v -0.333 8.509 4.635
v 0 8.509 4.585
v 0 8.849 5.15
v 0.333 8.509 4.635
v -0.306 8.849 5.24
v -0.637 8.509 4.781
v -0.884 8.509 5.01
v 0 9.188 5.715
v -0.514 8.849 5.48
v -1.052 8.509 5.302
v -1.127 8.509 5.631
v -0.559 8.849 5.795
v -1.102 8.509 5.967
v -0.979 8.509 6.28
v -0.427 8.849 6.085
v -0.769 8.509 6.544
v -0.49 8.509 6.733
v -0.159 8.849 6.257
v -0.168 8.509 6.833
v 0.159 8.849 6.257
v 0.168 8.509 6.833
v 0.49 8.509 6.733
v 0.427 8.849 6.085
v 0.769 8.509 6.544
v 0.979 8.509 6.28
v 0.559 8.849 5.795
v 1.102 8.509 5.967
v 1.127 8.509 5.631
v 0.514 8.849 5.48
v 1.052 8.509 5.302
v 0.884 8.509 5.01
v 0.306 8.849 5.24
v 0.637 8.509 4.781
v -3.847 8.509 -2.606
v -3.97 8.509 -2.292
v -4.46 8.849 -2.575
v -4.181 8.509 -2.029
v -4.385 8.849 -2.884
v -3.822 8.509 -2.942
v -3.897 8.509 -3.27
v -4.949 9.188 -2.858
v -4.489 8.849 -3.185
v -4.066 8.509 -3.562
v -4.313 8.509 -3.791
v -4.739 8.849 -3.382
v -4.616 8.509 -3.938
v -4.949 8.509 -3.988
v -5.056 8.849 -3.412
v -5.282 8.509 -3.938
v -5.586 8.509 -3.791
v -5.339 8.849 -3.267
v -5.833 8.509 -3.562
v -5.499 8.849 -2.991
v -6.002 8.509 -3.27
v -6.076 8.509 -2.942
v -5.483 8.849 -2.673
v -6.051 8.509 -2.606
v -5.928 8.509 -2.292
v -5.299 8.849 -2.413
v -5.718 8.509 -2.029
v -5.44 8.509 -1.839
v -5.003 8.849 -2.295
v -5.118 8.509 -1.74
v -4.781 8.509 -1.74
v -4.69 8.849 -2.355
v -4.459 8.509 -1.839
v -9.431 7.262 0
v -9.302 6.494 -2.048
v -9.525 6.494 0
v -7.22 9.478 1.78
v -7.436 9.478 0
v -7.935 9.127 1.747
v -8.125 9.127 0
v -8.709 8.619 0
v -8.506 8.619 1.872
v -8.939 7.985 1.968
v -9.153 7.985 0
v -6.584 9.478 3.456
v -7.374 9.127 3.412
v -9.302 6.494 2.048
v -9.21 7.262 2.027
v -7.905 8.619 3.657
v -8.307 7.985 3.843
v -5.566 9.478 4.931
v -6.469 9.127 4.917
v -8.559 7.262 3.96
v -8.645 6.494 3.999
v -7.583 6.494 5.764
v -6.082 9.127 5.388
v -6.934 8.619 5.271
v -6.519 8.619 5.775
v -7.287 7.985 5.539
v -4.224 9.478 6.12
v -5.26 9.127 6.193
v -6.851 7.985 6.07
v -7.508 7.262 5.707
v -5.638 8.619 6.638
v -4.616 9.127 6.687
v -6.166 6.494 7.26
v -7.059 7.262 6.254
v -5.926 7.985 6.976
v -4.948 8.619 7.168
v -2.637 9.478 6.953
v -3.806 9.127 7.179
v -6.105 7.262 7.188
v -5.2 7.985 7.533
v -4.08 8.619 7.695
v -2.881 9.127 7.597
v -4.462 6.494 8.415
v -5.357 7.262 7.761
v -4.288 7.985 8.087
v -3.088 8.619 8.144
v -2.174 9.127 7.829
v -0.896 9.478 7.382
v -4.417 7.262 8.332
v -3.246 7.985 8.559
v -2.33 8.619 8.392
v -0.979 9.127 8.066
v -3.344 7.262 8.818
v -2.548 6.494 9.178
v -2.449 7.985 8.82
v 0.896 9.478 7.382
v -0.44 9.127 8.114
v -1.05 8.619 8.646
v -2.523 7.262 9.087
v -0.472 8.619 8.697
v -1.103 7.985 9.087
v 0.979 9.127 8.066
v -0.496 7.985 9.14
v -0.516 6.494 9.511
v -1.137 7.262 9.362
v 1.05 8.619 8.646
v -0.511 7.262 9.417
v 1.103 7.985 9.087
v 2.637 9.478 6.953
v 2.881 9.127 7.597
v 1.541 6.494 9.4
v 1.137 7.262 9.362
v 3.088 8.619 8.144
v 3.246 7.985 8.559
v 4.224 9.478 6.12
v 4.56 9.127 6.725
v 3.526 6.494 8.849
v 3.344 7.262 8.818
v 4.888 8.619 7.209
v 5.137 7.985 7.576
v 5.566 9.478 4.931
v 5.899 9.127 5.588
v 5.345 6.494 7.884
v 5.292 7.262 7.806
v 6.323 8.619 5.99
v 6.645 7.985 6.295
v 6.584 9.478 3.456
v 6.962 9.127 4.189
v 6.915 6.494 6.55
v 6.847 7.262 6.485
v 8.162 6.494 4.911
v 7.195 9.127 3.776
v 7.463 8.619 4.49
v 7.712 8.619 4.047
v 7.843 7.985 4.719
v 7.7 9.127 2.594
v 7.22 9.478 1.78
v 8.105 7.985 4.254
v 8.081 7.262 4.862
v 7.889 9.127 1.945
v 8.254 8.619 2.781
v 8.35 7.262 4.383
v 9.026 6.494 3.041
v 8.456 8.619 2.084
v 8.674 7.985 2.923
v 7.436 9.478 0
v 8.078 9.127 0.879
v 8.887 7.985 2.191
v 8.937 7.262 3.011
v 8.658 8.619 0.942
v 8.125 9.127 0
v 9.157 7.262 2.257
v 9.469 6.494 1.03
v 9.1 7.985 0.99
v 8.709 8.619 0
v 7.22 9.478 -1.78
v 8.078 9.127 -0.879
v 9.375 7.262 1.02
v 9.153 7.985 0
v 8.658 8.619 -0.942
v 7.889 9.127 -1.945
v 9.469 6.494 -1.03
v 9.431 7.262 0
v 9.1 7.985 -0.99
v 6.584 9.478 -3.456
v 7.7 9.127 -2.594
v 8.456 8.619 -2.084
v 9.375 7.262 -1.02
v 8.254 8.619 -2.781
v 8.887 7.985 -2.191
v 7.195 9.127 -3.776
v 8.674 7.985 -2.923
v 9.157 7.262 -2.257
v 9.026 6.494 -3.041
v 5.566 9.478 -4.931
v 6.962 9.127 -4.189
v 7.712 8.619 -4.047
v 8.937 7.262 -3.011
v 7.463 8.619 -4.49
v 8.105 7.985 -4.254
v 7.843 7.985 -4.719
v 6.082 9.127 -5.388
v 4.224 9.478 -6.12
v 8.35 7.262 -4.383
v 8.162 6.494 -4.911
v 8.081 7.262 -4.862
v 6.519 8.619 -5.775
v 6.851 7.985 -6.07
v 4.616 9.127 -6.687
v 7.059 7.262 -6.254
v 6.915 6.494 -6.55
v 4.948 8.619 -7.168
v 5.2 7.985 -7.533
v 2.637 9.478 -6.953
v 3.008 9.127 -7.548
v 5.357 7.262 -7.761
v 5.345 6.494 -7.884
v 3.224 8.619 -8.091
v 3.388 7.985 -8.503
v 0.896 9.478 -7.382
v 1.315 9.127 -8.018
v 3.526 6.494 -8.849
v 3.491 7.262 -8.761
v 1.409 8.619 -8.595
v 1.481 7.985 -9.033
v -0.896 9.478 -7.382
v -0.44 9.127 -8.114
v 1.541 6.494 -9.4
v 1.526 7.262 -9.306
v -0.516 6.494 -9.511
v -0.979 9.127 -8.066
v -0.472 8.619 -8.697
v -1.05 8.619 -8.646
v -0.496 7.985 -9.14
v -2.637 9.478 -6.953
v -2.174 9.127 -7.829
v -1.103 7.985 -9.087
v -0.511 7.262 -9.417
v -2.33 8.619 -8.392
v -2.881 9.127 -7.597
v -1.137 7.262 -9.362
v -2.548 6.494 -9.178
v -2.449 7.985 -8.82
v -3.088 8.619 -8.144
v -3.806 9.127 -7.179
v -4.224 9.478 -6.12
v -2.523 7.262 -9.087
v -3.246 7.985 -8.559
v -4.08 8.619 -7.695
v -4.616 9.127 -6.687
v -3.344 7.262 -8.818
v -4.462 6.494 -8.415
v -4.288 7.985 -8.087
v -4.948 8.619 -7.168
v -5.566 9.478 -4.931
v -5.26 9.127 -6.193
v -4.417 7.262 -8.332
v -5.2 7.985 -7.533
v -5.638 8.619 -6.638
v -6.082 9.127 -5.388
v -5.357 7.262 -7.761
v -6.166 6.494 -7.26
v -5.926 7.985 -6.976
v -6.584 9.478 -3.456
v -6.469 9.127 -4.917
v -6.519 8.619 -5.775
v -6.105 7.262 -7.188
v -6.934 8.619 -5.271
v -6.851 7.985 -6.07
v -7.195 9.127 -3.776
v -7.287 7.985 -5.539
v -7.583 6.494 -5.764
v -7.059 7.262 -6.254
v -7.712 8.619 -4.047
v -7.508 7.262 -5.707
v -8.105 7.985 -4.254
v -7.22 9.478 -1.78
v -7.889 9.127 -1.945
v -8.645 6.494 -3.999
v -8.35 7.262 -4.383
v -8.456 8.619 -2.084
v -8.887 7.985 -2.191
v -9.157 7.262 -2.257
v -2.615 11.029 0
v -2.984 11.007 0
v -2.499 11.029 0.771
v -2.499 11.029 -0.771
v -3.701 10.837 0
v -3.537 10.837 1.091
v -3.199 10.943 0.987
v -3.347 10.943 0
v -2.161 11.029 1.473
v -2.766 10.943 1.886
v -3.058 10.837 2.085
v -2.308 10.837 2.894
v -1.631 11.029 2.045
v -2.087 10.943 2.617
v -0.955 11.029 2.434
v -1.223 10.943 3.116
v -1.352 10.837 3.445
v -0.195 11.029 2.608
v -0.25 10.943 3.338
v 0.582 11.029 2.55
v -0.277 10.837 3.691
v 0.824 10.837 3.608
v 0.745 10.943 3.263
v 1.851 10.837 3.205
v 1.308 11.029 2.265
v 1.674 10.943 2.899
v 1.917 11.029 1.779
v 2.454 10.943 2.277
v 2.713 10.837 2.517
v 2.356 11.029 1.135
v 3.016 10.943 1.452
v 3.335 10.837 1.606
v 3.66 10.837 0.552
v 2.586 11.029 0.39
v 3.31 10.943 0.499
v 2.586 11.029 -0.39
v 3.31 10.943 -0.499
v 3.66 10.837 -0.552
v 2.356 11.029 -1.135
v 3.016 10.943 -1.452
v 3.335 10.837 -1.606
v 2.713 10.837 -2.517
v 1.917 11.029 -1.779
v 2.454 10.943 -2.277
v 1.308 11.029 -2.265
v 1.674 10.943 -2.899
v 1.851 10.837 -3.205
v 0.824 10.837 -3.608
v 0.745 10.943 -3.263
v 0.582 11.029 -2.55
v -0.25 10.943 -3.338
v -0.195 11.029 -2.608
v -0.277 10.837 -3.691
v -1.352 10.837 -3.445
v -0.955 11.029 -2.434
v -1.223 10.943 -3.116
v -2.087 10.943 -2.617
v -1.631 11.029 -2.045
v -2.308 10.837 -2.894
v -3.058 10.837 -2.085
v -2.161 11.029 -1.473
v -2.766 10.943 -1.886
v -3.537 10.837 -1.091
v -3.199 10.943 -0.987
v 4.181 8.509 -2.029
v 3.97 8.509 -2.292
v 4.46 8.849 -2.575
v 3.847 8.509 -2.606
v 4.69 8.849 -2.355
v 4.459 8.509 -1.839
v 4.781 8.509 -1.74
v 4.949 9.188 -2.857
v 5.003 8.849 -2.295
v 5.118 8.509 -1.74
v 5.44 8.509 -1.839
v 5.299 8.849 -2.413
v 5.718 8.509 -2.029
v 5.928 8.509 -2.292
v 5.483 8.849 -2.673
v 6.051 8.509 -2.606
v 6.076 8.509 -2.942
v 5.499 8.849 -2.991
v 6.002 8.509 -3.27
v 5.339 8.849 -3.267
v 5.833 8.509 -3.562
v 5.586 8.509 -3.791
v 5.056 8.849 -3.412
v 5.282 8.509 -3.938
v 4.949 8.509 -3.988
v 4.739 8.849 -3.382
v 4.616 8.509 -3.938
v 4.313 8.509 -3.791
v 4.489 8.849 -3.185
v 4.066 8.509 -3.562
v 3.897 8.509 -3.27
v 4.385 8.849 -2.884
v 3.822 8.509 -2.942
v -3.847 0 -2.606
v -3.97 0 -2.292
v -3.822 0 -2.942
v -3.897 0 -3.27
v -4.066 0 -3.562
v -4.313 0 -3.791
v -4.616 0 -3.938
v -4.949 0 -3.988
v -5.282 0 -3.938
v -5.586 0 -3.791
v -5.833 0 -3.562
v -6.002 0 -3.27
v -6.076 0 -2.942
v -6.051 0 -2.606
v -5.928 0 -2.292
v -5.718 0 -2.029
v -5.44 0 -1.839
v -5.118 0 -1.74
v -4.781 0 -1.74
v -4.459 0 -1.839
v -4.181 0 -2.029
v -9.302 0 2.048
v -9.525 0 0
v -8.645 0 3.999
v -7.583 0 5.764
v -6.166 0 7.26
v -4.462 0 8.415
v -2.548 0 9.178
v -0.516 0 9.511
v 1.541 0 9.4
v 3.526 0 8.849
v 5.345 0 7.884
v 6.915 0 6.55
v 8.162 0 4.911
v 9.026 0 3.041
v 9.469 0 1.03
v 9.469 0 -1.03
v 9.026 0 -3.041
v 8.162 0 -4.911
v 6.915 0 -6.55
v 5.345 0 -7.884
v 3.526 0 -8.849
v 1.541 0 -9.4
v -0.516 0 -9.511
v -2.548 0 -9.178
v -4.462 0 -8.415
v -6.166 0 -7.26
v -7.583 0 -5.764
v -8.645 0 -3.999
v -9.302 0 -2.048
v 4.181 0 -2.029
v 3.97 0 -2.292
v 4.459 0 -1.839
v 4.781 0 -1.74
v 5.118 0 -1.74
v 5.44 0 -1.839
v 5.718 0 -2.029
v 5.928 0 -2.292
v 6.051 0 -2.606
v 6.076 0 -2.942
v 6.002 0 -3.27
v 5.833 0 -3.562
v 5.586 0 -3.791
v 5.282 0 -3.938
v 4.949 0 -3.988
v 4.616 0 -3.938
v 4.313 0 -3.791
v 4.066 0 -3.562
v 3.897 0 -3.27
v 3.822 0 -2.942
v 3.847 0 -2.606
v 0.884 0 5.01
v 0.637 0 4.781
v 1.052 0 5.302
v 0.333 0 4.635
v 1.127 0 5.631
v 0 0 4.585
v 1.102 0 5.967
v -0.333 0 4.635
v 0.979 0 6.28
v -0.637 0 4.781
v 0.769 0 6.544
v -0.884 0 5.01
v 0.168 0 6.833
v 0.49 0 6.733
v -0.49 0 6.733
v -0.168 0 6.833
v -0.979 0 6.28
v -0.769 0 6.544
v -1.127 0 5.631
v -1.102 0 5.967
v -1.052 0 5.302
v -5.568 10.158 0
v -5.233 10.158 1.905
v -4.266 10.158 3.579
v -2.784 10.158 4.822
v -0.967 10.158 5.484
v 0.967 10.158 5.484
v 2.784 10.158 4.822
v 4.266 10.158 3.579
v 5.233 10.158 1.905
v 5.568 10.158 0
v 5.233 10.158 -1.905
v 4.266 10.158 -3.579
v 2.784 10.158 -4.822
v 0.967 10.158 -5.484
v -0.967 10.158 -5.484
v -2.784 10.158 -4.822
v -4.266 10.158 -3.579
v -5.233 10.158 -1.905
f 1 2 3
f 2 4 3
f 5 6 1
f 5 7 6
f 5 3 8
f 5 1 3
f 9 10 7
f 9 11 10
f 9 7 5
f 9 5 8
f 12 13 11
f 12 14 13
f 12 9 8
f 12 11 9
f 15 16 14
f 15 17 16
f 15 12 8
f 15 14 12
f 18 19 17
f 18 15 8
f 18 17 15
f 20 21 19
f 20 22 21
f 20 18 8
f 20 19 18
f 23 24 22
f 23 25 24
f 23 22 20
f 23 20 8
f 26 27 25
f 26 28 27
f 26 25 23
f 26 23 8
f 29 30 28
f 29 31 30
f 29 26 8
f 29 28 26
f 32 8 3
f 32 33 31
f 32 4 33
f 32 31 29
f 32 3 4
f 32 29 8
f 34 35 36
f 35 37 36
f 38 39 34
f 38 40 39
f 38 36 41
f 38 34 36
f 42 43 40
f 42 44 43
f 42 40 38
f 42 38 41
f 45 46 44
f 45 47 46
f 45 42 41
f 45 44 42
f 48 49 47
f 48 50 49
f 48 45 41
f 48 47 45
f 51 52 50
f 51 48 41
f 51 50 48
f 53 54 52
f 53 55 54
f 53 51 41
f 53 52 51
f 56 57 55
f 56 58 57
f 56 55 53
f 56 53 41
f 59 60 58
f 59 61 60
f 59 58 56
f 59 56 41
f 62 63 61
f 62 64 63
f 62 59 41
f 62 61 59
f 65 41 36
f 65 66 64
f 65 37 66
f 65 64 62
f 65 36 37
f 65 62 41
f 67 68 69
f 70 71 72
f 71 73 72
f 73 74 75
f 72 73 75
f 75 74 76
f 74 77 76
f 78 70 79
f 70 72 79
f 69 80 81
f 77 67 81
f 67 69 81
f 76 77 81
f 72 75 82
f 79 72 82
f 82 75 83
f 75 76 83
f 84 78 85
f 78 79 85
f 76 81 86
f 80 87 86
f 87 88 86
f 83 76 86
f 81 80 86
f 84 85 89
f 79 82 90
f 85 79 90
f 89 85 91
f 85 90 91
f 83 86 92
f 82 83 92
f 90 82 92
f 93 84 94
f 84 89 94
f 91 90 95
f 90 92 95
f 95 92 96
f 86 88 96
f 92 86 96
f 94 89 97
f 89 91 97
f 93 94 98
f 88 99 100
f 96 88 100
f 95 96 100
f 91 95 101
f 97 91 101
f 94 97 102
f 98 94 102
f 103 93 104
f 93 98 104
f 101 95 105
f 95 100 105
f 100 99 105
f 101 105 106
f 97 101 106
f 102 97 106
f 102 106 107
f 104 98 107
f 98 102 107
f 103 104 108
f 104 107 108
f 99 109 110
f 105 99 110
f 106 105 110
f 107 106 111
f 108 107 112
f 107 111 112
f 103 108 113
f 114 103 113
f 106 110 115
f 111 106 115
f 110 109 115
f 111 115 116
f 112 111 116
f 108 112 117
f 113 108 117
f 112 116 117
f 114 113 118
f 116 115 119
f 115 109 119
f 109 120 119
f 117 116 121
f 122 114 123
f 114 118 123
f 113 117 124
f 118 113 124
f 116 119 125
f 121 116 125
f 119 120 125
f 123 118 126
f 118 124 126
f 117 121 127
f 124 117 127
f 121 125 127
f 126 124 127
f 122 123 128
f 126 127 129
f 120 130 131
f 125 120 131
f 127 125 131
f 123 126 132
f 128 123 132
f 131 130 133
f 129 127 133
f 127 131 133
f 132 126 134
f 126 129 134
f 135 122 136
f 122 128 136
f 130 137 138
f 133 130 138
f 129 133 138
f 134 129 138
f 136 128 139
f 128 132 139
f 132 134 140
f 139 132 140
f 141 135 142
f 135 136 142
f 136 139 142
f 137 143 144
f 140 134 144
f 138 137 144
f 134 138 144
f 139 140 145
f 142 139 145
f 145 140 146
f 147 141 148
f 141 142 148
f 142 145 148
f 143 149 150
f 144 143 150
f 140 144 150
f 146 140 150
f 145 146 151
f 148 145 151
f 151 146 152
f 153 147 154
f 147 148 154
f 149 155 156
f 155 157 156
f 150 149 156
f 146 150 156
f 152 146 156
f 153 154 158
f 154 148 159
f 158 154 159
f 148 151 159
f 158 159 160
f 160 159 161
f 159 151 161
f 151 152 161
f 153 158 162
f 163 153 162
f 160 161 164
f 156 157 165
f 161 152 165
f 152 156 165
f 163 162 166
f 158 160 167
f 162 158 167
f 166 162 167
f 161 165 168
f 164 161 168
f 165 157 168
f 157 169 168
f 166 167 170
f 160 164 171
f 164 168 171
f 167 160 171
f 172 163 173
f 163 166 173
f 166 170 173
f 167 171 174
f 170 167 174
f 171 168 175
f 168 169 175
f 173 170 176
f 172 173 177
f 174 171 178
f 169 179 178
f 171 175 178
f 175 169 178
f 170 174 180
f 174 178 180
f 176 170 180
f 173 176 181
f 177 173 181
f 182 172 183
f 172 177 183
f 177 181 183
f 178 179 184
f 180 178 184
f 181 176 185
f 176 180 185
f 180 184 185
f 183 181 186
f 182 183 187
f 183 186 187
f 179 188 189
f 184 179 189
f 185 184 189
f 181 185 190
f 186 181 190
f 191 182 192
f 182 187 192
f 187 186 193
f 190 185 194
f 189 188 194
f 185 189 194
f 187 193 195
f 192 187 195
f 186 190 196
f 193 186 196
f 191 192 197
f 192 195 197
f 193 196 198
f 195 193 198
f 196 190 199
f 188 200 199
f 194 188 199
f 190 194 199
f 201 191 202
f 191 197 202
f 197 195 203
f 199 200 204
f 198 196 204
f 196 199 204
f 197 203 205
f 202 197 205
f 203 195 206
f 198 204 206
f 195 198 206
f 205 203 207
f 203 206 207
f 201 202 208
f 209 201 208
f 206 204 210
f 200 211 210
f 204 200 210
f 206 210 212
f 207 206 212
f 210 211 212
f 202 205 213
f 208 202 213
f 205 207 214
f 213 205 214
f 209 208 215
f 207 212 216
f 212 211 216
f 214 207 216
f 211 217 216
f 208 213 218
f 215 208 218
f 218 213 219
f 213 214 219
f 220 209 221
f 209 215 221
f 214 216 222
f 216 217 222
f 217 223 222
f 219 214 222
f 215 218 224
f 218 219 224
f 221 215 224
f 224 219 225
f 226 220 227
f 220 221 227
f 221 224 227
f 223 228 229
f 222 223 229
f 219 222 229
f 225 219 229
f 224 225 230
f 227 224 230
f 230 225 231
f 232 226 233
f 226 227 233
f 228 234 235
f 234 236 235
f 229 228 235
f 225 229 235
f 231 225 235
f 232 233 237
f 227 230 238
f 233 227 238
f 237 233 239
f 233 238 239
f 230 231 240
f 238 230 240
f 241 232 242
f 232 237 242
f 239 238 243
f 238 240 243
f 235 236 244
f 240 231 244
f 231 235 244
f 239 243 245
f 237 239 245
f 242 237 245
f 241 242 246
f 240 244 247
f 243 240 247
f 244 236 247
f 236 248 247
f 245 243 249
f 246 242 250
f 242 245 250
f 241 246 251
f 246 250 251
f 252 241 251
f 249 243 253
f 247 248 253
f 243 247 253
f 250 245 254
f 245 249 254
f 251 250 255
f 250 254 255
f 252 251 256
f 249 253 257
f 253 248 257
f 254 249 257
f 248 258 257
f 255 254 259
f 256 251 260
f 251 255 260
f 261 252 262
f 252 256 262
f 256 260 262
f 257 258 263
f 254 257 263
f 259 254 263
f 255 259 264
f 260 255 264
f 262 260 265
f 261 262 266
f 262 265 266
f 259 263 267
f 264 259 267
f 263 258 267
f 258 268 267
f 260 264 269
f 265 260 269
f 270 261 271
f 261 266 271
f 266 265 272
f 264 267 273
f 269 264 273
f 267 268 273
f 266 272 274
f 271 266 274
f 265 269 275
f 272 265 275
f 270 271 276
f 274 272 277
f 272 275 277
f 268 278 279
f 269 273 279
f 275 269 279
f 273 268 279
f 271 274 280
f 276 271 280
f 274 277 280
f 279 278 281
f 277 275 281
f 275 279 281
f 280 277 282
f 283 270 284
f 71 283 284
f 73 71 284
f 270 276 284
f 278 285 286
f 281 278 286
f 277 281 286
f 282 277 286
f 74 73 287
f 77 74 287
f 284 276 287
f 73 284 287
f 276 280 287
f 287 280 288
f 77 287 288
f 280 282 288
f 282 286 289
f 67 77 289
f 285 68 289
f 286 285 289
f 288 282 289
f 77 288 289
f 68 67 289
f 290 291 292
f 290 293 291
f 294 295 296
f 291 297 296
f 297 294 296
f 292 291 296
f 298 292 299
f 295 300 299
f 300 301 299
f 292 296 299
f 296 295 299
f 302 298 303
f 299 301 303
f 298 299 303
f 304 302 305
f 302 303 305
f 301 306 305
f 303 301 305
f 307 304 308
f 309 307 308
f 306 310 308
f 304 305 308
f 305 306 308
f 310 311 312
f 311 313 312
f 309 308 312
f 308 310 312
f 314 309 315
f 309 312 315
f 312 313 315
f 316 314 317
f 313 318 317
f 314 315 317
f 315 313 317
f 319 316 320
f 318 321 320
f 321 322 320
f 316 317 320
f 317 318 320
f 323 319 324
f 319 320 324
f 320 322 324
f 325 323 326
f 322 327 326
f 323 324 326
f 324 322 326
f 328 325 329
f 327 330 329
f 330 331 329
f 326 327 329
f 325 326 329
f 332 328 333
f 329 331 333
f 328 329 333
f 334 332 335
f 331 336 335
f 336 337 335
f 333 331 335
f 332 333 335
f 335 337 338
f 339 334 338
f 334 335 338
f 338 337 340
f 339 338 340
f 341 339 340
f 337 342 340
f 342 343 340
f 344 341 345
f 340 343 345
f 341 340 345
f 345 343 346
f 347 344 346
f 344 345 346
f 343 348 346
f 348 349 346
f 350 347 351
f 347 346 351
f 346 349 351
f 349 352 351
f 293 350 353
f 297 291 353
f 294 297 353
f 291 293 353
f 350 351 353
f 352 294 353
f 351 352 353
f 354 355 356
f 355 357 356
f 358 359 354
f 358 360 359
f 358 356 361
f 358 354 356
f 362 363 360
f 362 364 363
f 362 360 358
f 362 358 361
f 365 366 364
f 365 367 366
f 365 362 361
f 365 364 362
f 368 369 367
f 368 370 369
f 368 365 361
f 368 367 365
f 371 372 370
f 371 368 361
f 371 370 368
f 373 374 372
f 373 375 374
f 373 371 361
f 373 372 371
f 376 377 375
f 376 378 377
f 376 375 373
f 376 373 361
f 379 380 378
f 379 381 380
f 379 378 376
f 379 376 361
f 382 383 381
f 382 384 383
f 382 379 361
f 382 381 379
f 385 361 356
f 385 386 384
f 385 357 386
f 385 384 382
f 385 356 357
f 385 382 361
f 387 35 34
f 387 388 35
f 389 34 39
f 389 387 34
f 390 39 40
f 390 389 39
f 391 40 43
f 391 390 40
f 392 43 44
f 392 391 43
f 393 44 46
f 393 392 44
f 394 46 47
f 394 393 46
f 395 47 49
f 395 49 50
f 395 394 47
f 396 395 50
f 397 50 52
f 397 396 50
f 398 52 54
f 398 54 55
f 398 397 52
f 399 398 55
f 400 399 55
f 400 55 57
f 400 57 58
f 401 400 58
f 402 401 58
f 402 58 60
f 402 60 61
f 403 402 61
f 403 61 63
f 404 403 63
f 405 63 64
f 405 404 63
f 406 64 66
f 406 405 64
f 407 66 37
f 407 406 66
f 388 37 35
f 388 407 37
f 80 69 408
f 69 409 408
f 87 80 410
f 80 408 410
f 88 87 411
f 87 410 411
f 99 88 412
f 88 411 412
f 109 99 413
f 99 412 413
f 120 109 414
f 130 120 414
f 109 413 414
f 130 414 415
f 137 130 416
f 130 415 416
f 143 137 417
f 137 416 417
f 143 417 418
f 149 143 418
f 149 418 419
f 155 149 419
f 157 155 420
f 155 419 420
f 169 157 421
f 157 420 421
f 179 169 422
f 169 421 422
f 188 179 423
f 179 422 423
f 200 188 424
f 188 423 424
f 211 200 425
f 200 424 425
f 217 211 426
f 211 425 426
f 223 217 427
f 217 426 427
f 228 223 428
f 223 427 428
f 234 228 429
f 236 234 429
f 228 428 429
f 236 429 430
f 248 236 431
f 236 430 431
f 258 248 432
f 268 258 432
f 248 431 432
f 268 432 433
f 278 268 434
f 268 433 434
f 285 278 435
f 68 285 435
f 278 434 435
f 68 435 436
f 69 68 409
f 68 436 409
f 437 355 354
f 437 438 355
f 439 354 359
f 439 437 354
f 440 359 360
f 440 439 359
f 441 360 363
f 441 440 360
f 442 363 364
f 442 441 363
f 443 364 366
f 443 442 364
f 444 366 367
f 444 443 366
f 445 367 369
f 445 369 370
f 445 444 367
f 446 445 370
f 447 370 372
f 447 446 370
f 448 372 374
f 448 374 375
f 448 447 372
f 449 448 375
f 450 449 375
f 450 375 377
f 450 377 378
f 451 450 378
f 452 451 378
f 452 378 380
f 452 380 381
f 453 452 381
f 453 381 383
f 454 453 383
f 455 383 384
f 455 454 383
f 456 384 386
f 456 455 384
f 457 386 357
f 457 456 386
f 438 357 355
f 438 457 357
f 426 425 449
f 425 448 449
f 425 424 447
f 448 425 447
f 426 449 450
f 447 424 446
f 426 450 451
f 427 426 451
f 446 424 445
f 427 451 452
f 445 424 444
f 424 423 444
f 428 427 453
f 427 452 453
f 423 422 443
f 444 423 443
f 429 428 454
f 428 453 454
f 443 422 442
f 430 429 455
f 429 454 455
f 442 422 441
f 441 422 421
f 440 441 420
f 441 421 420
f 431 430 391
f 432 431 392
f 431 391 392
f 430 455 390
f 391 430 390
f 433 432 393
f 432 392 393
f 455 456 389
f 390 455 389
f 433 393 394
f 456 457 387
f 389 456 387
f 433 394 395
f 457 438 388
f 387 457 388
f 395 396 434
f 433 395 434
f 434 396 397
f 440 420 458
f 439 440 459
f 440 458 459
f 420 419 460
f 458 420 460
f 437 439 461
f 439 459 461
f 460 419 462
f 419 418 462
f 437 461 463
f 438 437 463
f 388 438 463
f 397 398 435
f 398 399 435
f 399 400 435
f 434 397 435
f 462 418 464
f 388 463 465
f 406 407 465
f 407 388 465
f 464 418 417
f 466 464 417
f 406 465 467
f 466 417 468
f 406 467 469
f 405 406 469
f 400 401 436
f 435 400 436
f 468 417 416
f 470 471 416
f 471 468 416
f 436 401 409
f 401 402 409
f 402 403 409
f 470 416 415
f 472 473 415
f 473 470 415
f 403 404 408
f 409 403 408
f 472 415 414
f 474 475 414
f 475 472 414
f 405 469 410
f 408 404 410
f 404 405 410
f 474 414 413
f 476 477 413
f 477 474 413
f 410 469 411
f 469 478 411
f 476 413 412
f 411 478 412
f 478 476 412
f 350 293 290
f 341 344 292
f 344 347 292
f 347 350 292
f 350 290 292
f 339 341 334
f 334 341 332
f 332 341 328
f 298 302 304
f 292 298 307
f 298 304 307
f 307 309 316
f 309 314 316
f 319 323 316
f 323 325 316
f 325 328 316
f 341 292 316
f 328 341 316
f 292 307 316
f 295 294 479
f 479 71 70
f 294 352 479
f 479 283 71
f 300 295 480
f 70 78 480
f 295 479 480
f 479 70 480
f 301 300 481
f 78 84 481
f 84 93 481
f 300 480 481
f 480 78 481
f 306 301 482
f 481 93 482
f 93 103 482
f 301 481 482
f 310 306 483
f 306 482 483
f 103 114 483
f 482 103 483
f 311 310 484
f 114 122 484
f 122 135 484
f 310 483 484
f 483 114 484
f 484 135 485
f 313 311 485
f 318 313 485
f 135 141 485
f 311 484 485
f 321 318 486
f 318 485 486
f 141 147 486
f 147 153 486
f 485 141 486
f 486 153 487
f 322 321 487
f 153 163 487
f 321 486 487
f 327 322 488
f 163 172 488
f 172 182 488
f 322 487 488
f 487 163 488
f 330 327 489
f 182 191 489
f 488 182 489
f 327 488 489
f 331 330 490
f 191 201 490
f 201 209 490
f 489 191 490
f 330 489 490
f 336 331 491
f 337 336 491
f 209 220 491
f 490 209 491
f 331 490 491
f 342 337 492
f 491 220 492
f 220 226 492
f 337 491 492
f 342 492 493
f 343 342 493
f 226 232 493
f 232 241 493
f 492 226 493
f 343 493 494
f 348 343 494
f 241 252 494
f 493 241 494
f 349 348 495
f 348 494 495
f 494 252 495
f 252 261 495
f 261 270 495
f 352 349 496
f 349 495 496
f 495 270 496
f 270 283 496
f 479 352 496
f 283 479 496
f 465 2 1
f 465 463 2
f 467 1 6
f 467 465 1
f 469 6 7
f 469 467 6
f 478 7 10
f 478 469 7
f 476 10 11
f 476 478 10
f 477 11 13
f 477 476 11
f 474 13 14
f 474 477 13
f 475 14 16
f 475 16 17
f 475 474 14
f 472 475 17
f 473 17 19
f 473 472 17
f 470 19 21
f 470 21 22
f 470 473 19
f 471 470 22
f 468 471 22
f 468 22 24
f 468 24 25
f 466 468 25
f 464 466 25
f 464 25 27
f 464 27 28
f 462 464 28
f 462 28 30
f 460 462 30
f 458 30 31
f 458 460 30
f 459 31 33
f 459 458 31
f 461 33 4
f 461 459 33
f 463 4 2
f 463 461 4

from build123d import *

# Parameters (mm, degrees)
CIRPATTERN1_COUNT = 3


with BuildPart() as part:
    # Sketch1 → Revolve1 (revolve)
    with BuildSketch(Plane.XY):
        with BuildLine():
            Line((-9.525, 6.494310079), (-9.525, 0))
            Line((-9.525, 0), (0, 0))
            Line((0, 0), (0, 11.02868))
            Line((0, 11.02868), (-2.615161836, 11.02868))
            ThreePointArc((-2.615161836, 11.02868), (-3.1664948, 10.980444616), (-3.701075791, 10.837204071))
            Line((-3.701075791, 10.837204071), (-7.435913955, 9.47783415))
            ThreePointArc((-7.435913955, 9.47783415), (-8.950807741, 8.315415264), (-9.525, 6.494310079))
        make_face()
    revolve(axis=Axis((0, -0.551434, 0), (0, 1, 0)))

    # Sketch2 → #4-40 Tapped Hole1 (revolve, cut)
    with BuildSketch(Plane(origin=(0, 0, 5.715), x_dir=(0, 0, -1), z_dir=(1, 0, 0))):
        Polygon((0, 0), (0, 9.188152758), (1.1303, 8.509), (1.1303, 0), align=None)
    f_4_40_tapped_hole1 = revolve(axis=Axis((0, -6.35, 5.715), (0, 1, 0)), mode=Mode.SUBTRACT)

    # CirPattern1: #4-40 Tapped Hole1 ×3 about axis
    cirpattern1_axis = Axis((0, 0, 0), (0, 1, 0))
    for i in range(1, CIRPATTERN1_COUNT):
        add(f_4_40_tapped_hole1.rotate(cirpattern1_axis, i * 360 / CIRPATTERN1_COUNT), mode=Mode.SUBTRACT)


solid = part.part
